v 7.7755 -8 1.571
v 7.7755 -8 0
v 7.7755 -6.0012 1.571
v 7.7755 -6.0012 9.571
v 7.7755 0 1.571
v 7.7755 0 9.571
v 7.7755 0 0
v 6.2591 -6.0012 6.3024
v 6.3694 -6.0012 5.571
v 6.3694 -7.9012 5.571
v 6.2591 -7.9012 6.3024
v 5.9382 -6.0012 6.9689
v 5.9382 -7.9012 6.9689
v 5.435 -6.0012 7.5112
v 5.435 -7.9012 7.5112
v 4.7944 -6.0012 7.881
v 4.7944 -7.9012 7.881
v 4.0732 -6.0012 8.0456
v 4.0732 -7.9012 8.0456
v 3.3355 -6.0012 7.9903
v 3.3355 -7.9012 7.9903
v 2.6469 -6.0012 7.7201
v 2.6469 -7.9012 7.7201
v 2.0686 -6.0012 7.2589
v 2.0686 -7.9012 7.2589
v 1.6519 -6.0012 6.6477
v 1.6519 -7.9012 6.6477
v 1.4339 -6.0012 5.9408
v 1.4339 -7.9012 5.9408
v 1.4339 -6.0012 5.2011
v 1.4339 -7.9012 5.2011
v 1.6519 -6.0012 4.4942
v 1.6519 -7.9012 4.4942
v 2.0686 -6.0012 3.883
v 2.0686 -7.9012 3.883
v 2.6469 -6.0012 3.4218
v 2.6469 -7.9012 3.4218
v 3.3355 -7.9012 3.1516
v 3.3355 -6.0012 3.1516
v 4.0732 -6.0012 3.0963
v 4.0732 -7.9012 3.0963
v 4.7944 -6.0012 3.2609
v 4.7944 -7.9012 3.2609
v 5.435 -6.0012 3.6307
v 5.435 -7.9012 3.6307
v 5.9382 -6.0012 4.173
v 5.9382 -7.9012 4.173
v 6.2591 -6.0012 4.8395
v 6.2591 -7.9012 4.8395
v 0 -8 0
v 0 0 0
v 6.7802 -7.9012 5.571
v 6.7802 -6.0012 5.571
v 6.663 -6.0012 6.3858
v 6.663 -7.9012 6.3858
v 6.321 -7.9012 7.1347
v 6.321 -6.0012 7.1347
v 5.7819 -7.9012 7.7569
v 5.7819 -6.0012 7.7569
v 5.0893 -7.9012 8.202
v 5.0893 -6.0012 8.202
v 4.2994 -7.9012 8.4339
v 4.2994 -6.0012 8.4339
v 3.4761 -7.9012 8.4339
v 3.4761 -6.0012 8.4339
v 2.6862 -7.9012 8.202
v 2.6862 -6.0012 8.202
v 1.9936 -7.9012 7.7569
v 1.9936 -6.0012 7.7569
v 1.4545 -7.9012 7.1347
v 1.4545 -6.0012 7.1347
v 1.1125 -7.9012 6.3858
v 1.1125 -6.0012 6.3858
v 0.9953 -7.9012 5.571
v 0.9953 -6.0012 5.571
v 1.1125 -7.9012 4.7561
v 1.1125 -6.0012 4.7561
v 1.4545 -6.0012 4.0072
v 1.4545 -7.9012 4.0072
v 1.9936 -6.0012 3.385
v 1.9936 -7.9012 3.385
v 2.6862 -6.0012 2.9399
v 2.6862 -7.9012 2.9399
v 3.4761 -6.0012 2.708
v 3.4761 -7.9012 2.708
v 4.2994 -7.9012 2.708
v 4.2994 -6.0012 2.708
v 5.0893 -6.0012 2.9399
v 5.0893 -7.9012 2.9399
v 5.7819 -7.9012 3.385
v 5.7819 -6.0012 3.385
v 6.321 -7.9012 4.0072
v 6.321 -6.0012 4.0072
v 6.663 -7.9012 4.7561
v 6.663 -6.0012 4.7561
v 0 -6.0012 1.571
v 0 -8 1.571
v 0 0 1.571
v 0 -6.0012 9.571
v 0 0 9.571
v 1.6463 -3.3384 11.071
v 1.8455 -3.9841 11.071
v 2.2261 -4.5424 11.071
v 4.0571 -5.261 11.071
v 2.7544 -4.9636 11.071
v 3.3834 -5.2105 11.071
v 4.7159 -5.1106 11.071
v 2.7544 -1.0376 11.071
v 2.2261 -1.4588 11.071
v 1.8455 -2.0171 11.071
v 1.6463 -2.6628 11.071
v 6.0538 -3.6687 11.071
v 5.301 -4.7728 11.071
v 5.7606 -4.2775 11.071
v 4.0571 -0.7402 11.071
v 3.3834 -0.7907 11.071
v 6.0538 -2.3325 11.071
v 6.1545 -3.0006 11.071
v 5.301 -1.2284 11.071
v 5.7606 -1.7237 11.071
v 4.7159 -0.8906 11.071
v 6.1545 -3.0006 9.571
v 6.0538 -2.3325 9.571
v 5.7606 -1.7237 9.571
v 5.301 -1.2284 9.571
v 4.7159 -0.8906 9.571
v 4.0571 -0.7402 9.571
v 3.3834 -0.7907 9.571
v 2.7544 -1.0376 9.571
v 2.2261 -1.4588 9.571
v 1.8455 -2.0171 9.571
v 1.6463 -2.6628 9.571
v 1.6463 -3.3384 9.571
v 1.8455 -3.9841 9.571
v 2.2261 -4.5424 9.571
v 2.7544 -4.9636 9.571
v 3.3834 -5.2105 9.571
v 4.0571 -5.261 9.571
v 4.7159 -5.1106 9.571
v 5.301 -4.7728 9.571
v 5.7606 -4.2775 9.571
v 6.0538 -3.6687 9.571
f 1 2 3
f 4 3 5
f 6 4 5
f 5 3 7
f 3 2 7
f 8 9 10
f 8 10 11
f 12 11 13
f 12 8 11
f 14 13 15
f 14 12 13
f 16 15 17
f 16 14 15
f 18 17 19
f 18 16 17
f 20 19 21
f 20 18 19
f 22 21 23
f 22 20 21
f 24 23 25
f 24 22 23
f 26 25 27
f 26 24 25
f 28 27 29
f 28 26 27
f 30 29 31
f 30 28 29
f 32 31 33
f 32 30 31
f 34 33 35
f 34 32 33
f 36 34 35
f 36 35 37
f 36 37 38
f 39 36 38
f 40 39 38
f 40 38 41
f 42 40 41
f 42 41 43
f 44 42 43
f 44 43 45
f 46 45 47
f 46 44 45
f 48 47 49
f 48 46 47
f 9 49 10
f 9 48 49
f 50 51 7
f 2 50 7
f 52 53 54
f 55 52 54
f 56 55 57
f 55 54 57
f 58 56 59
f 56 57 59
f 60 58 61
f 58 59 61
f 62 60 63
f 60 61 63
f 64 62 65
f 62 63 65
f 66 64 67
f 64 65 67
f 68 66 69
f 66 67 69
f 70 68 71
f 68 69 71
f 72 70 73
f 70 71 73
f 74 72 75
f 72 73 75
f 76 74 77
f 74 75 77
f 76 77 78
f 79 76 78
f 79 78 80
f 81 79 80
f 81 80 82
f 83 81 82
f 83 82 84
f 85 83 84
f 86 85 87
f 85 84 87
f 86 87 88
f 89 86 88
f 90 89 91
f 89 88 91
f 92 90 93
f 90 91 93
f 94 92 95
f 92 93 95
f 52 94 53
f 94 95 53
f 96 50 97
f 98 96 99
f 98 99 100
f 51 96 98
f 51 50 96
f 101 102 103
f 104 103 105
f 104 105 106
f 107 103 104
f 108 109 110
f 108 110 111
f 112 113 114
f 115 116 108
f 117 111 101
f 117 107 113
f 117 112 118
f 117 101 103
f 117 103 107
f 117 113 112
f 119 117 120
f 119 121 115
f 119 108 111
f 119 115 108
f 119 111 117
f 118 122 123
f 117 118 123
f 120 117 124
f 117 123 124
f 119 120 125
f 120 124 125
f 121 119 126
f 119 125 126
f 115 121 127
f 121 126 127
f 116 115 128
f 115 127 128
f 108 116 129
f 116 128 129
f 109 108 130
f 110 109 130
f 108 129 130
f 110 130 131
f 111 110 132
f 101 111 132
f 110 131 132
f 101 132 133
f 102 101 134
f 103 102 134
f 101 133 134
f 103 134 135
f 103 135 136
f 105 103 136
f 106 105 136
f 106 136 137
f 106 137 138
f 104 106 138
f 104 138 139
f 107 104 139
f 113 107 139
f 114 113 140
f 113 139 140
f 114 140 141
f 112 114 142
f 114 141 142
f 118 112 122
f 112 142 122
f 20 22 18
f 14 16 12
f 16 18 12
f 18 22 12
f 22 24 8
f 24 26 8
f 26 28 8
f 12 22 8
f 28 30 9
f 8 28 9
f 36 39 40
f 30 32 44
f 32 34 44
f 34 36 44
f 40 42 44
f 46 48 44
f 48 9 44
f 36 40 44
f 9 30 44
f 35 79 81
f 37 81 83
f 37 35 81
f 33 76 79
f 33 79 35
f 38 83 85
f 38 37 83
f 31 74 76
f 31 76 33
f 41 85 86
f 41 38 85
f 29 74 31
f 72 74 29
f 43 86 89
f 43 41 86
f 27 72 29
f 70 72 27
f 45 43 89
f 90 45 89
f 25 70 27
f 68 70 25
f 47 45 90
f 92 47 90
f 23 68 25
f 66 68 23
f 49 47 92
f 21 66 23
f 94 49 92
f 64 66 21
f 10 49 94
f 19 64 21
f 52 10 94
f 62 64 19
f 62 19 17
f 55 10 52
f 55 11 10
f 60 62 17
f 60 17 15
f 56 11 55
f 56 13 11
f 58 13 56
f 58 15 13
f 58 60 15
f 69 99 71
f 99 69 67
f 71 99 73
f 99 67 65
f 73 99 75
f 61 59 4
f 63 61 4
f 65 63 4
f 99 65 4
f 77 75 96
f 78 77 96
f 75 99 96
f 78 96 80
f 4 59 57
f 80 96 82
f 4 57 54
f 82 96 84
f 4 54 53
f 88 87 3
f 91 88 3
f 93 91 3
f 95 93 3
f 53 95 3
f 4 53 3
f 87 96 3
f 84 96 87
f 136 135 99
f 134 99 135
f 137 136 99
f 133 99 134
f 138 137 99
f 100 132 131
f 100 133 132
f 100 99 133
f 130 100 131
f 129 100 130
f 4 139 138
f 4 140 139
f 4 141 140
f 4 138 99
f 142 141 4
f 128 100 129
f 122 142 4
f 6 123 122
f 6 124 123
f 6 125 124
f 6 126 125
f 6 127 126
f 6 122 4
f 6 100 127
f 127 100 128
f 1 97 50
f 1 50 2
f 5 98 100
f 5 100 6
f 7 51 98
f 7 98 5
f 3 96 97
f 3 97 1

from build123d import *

# Parameters (mm, degrees)
F0_W     = 7.7755046077
F0_H     = 1.5709503787
F1_DEPTH = 8
F2_W     = 7.7755046077
F2_H     = 6.0012028553
F3_DEPTH = 8
F4_R     = 2.8924366319
F4_R_2   = 2.4816180031
F5_DEPTH = 1.9
F6_R     = 2.2667202486
F7_DEPTH = 1.5


with BuildPart() as f1:
    # F0 (on Front) → F1 (new body)
    with BuildSketch(Plane.XZ):
        with Locations((3.8877523039, 0.7854751893)):
            Rectangle(F0_W, F0_H)
    extrude(amount=F1_DEPTH)

    # F2 (on face) → F3 (join)
    with BuildSketch(Plane.XY.offset(1.5709503787)):
        with Locations((3.8877523039, -3.0006014276)):
            Rectangle(F2_W, F2_H)
    extrude(amount=F3_DEPTH)

    # F4 (on face) → F5 (join)
    with BuildSketch(Plane.XZ.offset(6.0012028553)):
        with Locations((3.8877523039, 5.5709503787)):
            Circle(F4_R)
        with Locations((3.8877523039, 5.5709503787)):
            Circle(F4_R_2, mode=Mode.SUBTRACT)
    extrude(amount=F5_DEPTH)

    # F6 (on face) → F7 (join)
    with BuildSketch(Plane.XY.offset(9.5709503787)):
        with Locations((3.8877523039, -3.0006014276)):
            Circle(F6_R)
    extrude(amount=F7_DEPTH)


solid = f1.part
